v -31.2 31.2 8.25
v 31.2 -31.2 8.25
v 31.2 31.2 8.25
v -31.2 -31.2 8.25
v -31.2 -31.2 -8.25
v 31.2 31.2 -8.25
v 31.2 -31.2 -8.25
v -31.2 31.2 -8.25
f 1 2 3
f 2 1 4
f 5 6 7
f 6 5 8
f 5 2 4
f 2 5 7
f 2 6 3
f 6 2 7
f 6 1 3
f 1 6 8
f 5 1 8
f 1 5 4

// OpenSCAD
dongle_th  = 16.5;
dongle_w = 62.4;

cube([dongle_w, dongle_w, dongle_th], center=true);
